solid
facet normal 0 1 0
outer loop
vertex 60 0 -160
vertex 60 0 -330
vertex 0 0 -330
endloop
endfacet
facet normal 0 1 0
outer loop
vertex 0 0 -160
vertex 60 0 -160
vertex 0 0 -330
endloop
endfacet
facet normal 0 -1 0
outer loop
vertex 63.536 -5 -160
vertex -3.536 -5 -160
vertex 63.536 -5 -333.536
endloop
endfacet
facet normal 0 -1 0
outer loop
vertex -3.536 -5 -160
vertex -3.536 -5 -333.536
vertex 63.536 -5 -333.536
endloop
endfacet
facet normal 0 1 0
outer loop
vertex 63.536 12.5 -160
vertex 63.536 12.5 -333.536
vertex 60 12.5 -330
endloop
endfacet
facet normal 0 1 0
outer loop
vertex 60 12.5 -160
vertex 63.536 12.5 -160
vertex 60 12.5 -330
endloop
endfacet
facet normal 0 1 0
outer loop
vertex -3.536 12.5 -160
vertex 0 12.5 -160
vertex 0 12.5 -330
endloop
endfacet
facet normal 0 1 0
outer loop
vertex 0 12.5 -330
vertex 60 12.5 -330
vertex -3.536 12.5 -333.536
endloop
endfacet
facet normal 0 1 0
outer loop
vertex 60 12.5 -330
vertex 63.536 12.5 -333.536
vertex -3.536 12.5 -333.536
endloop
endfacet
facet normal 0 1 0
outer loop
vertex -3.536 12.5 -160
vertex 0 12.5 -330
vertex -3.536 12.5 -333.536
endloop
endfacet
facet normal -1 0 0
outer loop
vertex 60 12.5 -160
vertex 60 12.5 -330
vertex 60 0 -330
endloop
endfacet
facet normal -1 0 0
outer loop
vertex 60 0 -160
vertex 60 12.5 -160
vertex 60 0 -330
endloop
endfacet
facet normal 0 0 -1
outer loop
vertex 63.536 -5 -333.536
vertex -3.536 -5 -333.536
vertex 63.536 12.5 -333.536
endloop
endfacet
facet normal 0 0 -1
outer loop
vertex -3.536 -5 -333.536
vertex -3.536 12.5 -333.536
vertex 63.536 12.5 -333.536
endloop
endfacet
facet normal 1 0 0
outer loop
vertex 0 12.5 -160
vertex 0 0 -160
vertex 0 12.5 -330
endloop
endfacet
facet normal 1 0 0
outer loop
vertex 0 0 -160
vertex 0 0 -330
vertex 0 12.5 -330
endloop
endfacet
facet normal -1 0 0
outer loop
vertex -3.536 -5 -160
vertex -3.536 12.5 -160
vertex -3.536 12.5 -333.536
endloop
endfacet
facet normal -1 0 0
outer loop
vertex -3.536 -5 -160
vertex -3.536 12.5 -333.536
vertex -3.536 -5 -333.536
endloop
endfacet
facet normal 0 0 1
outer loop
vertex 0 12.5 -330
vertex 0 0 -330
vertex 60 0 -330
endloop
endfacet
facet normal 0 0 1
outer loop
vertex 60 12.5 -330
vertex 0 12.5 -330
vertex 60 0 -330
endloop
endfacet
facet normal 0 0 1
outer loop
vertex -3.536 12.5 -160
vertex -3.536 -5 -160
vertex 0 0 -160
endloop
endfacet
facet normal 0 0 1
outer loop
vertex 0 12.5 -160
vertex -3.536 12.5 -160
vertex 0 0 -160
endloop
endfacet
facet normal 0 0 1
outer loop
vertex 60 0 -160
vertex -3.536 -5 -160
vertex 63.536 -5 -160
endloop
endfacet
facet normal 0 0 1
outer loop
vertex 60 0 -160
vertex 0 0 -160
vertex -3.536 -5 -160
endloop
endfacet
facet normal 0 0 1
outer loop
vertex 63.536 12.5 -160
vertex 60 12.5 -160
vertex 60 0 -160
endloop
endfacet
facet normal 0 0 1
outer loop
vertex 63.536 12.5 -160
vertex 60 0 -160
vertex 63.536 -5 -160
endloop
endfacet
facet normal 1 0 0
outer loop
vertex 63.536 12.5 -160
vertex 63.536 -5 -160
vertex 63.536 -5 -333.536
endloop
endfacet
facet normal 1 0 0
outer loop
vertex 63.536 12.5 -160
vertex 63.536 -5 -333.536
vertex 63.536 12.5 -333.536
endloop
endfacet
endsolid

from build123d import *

# Parameters (mm, degrees)
SKETCH2_W             = 67.071067812
SKETCH2_H             = 337.071067812
SKETCH2_W_2           = 60
SKETCH2_H_2           = 330
BOSS_EXTRUDE1_DEPTH   = 12.5
SKETCH3_W             = 67.071067812
SKETCH3_H             = 337.071067812
BOSS_EXTRUDE2_DEPTH   = 5
BODY_MOVE_COPY2_ANGLE = 180
BOSS_EXTRUDE3_DEPTH   = 5


with BuildPart() as part:
    # Sketch2 → Boss-Extrude1 (new body)
    with BuildSketch(Plane(origin=(0, 0, 0), x_dir=(1, 0, 0), z_dir=(0, 1, 0))):
        with Locations((30, 165)):
            Rectangle(SKETCH2_W, SKETCH2_H)
        with Locations((30, 165)):
            Rectangle(SKETCH2_W_2, SKETCH2_H_2, mode=Mode.SUBTRACT)
    extrude(amount=BOSS_EXTRUDE1_DEPTH)

    # Sketch3 → Boss-Extrude2 (add)
    with BuildSketch(Plane.XZ):
        with Locations((30, -165)):
            Rectangle(SKETCH3_W, SKETCH3_H)
    extrude(amount=BOSS_EXTRUDE2_DEPTH)


with BuildPart() as body_2:
    # Split1: the piece on the far side of the plane
    add(part.part)
    split(bisect_by=Plane(origin=(0, 0, -165), x_dir=(-1, 0, 0), z_dir=(0, 0, -1)), keep=Keep.BOTTOM)


with BuildPart() as part_1:
    add(part.part)

    # Split1
    split(bisect_by=Plane(origin=(0, 0, -165), x_dir=(-1, 0, 0), z_dir=(0, 0, -1)), keep=Keep.TOP)

    # Sketch4 → Boss-Extrude3 (add)
    with BuildSketch(Plane.XY.offset(-165)):
        Polygon((60, 0), (0, 0), (0, 12.5), (-3.535533906, 12.5), (-3.535533906, -5), (63.535533906, -5), (63.535533906, 12.5), (60, 12.5), align=None)
    extrude(amount=BOSS_EXTRUDE3_DEPTH)


with BuildPart() as body_2_1:
    # Body-Move/Copy2: read off the stored shape, not the designer's step
    # Body-Move/Copy2: moved
    add(body_2.part.moved(Location((-127.0710678, -25, 0))).rotate(Axis((0, 0, 0), (0, 0, 1)), BODY_MOVE_COPY2_ANGLE))


solid = part_1.part
